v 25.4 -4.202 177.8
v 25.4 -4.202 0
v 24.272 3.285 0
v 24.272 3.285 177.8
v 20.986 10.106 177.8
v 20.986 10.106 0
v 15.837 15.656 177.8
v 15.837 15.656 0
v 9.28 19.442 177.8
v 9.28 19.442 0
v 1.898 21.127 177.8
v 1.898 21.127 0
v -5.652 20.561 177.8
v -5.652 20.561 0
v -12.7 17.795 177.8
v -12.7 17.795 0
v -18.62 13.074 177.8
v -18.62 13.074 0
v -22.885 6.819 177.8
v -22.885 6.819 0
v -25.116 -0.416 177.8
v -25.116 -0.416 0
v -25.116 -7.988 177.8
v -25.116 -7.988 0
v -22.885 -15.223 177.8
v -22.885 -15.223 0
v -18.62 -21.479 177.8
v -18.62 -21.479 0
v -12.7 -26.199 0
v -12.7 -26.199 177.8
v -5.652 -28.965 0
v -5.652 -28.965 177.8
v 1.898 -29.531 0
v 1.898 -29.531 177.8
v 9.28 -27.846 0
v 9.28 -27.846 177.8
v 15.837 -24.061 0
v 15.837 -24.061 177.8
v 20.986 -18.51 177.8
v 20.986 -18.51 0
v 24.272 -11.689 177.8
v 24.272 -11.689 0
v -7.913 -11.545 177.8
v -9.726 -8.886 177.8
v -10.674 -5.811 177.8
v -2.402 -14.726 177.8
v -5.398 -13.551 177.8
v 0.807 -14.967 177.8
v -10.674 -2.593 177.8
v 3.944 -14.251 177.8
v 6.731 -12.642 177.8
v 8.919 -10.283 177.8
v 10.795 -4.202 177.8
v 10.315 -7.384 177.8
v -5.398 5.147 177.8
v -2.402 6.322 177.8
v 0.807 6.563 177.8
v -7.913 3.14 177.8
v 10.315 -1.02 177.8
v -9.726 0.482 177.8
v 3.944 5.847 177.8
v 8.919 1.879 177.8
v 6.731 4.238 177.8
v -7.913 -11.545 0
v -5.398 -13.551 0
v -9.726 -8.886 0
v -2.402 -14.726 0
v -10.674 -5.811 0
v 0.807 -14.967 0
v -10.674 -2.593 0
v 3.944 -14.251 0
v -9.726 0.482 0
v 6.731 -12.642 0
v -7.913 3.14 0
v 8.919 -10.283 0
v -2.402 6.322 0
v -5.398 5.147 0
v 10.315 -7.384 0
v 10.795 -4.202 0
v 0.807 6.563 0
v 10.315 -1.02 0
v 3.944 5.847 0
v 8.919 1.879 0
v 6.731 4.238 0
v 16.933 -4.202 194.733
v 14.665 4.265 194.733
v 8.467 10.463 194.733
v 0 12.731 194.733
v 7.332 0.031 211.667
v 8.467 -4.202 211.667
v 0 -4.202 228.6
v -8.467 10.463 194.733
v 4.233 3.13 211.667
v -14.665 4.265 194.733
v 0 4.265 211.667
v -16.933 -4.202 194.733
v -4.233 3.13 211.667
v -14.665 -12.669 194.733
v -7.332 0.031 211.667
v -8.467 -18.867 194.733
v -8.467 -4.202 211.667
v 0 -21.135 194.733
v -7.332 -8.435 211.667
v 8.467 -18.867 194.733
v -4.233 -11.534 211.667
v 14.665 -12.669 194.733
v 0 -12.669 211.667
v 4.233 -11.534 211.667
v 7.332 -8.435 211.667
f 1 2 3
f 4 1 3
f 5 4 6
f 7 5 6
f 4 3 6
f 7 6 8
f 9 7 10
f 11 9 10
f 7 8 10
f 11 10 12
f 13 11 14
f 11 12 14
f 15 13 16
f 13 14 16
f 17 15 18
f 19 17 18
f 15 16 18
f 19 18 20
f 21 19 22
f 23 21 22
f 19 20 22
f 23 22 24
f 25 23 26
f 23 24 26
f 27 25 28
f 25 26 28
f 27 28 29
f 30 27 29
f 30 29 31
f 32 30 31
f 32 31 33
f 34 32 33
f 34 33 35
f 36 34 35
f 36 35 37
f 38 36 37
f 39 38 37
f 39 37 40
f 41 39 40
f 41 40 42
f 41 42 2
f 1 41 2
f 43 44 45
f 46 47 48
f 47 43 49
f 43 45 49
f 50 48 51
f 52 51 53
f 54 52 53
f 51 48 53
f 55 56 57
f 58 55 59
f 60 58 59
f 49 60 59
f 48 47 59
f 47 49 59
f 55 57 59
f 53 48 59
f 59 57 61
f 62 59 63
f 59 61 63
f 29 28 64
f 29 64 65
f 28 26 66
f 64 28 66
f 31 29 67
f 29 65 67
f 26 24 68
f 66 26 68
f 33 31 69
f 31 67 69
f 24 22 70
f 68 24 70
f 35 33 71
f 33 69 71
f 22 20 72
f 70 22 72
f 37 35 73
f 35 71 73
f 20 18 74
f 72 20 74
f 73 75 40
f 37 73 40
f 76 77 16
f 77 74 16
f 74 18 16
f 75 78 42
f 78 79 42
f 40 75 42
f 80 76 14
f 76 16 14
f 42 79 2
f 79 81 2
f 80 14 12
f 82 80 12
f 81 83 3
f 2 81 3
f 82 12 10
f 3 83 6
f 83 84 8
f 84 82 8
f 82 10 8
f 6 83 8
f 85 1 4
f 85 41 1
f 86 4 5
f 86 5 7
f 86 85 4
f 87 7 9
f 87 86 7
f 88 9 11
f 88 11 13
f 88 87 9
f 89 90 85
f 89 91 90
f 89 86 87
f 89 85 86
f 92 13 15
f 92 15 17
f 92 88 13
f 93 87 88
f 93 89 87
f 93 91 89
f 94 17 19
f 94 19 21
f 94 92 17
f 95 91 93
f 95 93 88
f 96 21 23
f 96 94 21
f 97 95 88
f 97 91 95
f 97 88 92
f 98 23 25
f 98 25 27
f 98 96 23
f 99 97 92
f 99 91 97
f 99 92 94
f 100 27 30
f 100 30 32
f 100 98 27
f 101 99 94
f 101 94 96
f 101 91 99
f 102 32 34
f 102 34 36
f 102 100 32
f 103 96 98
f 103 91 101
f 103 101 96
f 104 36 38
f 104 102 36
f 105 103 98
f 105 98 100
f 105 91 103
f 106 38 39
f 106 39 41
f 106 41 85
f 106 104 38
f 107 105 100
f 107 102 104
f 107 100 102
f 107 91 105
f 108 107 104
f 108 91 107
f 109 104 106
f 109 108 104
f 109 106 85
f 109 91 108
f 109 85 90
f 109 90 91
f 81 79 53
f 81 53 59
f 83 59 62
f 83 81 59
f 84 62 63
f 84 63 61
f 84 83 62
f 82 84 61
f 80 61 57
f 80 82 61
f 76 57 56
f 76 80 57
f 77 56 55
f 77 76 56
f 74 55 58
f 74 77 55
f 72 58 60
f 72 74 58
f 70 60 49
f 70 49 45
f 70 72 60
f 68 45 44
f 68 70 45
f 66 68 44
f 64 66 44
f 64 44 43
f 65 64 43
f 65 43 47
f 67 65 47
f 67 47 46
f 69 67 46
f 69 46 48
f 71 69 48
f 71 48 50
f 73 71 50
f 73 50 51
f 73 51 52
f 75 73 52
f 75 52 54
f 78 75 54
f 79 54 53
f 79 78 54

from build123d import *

# Parameters (mm, degrees)
F0_R     = 25.4
F0_R_2   = 10.795
F1_DEPTH = 177.8
F2_R     = 25.4
F3_DEPTH = 50.8
F4_SIZE2 = 25.4
F4_SIZE  = 50.8


with BuildPart() as f1:
    # F0 (on Top) → F1 (new body)
    with BuildSketch(Plane.XY):
        with Locations((0, -4.202133)):
            Circle(F0_R)
        with Locations((0, -4.202133)):
            Circle(F0_R_2, mode=Mode.SUBTRACT)
    extrude(amount=F1_DEPTH)

    # F2 (on face) → F3 (join)
    with BuildSketch(Plane.XY.offset(177.8)):
        with Locations((0, -4.202133)):
            Circle(F2_R)
    extrude(amount=F3_DEPTH)

    # F4
    f4_edges = [f1.edges().sort_by_distance(p)[0] for p in [
        (-25.4, -4.202133, 228.6),
    ]]
    chamfer(f4_edges, length=F4_SIZE, length2=F4_SIZE2)


solid = f1.part
